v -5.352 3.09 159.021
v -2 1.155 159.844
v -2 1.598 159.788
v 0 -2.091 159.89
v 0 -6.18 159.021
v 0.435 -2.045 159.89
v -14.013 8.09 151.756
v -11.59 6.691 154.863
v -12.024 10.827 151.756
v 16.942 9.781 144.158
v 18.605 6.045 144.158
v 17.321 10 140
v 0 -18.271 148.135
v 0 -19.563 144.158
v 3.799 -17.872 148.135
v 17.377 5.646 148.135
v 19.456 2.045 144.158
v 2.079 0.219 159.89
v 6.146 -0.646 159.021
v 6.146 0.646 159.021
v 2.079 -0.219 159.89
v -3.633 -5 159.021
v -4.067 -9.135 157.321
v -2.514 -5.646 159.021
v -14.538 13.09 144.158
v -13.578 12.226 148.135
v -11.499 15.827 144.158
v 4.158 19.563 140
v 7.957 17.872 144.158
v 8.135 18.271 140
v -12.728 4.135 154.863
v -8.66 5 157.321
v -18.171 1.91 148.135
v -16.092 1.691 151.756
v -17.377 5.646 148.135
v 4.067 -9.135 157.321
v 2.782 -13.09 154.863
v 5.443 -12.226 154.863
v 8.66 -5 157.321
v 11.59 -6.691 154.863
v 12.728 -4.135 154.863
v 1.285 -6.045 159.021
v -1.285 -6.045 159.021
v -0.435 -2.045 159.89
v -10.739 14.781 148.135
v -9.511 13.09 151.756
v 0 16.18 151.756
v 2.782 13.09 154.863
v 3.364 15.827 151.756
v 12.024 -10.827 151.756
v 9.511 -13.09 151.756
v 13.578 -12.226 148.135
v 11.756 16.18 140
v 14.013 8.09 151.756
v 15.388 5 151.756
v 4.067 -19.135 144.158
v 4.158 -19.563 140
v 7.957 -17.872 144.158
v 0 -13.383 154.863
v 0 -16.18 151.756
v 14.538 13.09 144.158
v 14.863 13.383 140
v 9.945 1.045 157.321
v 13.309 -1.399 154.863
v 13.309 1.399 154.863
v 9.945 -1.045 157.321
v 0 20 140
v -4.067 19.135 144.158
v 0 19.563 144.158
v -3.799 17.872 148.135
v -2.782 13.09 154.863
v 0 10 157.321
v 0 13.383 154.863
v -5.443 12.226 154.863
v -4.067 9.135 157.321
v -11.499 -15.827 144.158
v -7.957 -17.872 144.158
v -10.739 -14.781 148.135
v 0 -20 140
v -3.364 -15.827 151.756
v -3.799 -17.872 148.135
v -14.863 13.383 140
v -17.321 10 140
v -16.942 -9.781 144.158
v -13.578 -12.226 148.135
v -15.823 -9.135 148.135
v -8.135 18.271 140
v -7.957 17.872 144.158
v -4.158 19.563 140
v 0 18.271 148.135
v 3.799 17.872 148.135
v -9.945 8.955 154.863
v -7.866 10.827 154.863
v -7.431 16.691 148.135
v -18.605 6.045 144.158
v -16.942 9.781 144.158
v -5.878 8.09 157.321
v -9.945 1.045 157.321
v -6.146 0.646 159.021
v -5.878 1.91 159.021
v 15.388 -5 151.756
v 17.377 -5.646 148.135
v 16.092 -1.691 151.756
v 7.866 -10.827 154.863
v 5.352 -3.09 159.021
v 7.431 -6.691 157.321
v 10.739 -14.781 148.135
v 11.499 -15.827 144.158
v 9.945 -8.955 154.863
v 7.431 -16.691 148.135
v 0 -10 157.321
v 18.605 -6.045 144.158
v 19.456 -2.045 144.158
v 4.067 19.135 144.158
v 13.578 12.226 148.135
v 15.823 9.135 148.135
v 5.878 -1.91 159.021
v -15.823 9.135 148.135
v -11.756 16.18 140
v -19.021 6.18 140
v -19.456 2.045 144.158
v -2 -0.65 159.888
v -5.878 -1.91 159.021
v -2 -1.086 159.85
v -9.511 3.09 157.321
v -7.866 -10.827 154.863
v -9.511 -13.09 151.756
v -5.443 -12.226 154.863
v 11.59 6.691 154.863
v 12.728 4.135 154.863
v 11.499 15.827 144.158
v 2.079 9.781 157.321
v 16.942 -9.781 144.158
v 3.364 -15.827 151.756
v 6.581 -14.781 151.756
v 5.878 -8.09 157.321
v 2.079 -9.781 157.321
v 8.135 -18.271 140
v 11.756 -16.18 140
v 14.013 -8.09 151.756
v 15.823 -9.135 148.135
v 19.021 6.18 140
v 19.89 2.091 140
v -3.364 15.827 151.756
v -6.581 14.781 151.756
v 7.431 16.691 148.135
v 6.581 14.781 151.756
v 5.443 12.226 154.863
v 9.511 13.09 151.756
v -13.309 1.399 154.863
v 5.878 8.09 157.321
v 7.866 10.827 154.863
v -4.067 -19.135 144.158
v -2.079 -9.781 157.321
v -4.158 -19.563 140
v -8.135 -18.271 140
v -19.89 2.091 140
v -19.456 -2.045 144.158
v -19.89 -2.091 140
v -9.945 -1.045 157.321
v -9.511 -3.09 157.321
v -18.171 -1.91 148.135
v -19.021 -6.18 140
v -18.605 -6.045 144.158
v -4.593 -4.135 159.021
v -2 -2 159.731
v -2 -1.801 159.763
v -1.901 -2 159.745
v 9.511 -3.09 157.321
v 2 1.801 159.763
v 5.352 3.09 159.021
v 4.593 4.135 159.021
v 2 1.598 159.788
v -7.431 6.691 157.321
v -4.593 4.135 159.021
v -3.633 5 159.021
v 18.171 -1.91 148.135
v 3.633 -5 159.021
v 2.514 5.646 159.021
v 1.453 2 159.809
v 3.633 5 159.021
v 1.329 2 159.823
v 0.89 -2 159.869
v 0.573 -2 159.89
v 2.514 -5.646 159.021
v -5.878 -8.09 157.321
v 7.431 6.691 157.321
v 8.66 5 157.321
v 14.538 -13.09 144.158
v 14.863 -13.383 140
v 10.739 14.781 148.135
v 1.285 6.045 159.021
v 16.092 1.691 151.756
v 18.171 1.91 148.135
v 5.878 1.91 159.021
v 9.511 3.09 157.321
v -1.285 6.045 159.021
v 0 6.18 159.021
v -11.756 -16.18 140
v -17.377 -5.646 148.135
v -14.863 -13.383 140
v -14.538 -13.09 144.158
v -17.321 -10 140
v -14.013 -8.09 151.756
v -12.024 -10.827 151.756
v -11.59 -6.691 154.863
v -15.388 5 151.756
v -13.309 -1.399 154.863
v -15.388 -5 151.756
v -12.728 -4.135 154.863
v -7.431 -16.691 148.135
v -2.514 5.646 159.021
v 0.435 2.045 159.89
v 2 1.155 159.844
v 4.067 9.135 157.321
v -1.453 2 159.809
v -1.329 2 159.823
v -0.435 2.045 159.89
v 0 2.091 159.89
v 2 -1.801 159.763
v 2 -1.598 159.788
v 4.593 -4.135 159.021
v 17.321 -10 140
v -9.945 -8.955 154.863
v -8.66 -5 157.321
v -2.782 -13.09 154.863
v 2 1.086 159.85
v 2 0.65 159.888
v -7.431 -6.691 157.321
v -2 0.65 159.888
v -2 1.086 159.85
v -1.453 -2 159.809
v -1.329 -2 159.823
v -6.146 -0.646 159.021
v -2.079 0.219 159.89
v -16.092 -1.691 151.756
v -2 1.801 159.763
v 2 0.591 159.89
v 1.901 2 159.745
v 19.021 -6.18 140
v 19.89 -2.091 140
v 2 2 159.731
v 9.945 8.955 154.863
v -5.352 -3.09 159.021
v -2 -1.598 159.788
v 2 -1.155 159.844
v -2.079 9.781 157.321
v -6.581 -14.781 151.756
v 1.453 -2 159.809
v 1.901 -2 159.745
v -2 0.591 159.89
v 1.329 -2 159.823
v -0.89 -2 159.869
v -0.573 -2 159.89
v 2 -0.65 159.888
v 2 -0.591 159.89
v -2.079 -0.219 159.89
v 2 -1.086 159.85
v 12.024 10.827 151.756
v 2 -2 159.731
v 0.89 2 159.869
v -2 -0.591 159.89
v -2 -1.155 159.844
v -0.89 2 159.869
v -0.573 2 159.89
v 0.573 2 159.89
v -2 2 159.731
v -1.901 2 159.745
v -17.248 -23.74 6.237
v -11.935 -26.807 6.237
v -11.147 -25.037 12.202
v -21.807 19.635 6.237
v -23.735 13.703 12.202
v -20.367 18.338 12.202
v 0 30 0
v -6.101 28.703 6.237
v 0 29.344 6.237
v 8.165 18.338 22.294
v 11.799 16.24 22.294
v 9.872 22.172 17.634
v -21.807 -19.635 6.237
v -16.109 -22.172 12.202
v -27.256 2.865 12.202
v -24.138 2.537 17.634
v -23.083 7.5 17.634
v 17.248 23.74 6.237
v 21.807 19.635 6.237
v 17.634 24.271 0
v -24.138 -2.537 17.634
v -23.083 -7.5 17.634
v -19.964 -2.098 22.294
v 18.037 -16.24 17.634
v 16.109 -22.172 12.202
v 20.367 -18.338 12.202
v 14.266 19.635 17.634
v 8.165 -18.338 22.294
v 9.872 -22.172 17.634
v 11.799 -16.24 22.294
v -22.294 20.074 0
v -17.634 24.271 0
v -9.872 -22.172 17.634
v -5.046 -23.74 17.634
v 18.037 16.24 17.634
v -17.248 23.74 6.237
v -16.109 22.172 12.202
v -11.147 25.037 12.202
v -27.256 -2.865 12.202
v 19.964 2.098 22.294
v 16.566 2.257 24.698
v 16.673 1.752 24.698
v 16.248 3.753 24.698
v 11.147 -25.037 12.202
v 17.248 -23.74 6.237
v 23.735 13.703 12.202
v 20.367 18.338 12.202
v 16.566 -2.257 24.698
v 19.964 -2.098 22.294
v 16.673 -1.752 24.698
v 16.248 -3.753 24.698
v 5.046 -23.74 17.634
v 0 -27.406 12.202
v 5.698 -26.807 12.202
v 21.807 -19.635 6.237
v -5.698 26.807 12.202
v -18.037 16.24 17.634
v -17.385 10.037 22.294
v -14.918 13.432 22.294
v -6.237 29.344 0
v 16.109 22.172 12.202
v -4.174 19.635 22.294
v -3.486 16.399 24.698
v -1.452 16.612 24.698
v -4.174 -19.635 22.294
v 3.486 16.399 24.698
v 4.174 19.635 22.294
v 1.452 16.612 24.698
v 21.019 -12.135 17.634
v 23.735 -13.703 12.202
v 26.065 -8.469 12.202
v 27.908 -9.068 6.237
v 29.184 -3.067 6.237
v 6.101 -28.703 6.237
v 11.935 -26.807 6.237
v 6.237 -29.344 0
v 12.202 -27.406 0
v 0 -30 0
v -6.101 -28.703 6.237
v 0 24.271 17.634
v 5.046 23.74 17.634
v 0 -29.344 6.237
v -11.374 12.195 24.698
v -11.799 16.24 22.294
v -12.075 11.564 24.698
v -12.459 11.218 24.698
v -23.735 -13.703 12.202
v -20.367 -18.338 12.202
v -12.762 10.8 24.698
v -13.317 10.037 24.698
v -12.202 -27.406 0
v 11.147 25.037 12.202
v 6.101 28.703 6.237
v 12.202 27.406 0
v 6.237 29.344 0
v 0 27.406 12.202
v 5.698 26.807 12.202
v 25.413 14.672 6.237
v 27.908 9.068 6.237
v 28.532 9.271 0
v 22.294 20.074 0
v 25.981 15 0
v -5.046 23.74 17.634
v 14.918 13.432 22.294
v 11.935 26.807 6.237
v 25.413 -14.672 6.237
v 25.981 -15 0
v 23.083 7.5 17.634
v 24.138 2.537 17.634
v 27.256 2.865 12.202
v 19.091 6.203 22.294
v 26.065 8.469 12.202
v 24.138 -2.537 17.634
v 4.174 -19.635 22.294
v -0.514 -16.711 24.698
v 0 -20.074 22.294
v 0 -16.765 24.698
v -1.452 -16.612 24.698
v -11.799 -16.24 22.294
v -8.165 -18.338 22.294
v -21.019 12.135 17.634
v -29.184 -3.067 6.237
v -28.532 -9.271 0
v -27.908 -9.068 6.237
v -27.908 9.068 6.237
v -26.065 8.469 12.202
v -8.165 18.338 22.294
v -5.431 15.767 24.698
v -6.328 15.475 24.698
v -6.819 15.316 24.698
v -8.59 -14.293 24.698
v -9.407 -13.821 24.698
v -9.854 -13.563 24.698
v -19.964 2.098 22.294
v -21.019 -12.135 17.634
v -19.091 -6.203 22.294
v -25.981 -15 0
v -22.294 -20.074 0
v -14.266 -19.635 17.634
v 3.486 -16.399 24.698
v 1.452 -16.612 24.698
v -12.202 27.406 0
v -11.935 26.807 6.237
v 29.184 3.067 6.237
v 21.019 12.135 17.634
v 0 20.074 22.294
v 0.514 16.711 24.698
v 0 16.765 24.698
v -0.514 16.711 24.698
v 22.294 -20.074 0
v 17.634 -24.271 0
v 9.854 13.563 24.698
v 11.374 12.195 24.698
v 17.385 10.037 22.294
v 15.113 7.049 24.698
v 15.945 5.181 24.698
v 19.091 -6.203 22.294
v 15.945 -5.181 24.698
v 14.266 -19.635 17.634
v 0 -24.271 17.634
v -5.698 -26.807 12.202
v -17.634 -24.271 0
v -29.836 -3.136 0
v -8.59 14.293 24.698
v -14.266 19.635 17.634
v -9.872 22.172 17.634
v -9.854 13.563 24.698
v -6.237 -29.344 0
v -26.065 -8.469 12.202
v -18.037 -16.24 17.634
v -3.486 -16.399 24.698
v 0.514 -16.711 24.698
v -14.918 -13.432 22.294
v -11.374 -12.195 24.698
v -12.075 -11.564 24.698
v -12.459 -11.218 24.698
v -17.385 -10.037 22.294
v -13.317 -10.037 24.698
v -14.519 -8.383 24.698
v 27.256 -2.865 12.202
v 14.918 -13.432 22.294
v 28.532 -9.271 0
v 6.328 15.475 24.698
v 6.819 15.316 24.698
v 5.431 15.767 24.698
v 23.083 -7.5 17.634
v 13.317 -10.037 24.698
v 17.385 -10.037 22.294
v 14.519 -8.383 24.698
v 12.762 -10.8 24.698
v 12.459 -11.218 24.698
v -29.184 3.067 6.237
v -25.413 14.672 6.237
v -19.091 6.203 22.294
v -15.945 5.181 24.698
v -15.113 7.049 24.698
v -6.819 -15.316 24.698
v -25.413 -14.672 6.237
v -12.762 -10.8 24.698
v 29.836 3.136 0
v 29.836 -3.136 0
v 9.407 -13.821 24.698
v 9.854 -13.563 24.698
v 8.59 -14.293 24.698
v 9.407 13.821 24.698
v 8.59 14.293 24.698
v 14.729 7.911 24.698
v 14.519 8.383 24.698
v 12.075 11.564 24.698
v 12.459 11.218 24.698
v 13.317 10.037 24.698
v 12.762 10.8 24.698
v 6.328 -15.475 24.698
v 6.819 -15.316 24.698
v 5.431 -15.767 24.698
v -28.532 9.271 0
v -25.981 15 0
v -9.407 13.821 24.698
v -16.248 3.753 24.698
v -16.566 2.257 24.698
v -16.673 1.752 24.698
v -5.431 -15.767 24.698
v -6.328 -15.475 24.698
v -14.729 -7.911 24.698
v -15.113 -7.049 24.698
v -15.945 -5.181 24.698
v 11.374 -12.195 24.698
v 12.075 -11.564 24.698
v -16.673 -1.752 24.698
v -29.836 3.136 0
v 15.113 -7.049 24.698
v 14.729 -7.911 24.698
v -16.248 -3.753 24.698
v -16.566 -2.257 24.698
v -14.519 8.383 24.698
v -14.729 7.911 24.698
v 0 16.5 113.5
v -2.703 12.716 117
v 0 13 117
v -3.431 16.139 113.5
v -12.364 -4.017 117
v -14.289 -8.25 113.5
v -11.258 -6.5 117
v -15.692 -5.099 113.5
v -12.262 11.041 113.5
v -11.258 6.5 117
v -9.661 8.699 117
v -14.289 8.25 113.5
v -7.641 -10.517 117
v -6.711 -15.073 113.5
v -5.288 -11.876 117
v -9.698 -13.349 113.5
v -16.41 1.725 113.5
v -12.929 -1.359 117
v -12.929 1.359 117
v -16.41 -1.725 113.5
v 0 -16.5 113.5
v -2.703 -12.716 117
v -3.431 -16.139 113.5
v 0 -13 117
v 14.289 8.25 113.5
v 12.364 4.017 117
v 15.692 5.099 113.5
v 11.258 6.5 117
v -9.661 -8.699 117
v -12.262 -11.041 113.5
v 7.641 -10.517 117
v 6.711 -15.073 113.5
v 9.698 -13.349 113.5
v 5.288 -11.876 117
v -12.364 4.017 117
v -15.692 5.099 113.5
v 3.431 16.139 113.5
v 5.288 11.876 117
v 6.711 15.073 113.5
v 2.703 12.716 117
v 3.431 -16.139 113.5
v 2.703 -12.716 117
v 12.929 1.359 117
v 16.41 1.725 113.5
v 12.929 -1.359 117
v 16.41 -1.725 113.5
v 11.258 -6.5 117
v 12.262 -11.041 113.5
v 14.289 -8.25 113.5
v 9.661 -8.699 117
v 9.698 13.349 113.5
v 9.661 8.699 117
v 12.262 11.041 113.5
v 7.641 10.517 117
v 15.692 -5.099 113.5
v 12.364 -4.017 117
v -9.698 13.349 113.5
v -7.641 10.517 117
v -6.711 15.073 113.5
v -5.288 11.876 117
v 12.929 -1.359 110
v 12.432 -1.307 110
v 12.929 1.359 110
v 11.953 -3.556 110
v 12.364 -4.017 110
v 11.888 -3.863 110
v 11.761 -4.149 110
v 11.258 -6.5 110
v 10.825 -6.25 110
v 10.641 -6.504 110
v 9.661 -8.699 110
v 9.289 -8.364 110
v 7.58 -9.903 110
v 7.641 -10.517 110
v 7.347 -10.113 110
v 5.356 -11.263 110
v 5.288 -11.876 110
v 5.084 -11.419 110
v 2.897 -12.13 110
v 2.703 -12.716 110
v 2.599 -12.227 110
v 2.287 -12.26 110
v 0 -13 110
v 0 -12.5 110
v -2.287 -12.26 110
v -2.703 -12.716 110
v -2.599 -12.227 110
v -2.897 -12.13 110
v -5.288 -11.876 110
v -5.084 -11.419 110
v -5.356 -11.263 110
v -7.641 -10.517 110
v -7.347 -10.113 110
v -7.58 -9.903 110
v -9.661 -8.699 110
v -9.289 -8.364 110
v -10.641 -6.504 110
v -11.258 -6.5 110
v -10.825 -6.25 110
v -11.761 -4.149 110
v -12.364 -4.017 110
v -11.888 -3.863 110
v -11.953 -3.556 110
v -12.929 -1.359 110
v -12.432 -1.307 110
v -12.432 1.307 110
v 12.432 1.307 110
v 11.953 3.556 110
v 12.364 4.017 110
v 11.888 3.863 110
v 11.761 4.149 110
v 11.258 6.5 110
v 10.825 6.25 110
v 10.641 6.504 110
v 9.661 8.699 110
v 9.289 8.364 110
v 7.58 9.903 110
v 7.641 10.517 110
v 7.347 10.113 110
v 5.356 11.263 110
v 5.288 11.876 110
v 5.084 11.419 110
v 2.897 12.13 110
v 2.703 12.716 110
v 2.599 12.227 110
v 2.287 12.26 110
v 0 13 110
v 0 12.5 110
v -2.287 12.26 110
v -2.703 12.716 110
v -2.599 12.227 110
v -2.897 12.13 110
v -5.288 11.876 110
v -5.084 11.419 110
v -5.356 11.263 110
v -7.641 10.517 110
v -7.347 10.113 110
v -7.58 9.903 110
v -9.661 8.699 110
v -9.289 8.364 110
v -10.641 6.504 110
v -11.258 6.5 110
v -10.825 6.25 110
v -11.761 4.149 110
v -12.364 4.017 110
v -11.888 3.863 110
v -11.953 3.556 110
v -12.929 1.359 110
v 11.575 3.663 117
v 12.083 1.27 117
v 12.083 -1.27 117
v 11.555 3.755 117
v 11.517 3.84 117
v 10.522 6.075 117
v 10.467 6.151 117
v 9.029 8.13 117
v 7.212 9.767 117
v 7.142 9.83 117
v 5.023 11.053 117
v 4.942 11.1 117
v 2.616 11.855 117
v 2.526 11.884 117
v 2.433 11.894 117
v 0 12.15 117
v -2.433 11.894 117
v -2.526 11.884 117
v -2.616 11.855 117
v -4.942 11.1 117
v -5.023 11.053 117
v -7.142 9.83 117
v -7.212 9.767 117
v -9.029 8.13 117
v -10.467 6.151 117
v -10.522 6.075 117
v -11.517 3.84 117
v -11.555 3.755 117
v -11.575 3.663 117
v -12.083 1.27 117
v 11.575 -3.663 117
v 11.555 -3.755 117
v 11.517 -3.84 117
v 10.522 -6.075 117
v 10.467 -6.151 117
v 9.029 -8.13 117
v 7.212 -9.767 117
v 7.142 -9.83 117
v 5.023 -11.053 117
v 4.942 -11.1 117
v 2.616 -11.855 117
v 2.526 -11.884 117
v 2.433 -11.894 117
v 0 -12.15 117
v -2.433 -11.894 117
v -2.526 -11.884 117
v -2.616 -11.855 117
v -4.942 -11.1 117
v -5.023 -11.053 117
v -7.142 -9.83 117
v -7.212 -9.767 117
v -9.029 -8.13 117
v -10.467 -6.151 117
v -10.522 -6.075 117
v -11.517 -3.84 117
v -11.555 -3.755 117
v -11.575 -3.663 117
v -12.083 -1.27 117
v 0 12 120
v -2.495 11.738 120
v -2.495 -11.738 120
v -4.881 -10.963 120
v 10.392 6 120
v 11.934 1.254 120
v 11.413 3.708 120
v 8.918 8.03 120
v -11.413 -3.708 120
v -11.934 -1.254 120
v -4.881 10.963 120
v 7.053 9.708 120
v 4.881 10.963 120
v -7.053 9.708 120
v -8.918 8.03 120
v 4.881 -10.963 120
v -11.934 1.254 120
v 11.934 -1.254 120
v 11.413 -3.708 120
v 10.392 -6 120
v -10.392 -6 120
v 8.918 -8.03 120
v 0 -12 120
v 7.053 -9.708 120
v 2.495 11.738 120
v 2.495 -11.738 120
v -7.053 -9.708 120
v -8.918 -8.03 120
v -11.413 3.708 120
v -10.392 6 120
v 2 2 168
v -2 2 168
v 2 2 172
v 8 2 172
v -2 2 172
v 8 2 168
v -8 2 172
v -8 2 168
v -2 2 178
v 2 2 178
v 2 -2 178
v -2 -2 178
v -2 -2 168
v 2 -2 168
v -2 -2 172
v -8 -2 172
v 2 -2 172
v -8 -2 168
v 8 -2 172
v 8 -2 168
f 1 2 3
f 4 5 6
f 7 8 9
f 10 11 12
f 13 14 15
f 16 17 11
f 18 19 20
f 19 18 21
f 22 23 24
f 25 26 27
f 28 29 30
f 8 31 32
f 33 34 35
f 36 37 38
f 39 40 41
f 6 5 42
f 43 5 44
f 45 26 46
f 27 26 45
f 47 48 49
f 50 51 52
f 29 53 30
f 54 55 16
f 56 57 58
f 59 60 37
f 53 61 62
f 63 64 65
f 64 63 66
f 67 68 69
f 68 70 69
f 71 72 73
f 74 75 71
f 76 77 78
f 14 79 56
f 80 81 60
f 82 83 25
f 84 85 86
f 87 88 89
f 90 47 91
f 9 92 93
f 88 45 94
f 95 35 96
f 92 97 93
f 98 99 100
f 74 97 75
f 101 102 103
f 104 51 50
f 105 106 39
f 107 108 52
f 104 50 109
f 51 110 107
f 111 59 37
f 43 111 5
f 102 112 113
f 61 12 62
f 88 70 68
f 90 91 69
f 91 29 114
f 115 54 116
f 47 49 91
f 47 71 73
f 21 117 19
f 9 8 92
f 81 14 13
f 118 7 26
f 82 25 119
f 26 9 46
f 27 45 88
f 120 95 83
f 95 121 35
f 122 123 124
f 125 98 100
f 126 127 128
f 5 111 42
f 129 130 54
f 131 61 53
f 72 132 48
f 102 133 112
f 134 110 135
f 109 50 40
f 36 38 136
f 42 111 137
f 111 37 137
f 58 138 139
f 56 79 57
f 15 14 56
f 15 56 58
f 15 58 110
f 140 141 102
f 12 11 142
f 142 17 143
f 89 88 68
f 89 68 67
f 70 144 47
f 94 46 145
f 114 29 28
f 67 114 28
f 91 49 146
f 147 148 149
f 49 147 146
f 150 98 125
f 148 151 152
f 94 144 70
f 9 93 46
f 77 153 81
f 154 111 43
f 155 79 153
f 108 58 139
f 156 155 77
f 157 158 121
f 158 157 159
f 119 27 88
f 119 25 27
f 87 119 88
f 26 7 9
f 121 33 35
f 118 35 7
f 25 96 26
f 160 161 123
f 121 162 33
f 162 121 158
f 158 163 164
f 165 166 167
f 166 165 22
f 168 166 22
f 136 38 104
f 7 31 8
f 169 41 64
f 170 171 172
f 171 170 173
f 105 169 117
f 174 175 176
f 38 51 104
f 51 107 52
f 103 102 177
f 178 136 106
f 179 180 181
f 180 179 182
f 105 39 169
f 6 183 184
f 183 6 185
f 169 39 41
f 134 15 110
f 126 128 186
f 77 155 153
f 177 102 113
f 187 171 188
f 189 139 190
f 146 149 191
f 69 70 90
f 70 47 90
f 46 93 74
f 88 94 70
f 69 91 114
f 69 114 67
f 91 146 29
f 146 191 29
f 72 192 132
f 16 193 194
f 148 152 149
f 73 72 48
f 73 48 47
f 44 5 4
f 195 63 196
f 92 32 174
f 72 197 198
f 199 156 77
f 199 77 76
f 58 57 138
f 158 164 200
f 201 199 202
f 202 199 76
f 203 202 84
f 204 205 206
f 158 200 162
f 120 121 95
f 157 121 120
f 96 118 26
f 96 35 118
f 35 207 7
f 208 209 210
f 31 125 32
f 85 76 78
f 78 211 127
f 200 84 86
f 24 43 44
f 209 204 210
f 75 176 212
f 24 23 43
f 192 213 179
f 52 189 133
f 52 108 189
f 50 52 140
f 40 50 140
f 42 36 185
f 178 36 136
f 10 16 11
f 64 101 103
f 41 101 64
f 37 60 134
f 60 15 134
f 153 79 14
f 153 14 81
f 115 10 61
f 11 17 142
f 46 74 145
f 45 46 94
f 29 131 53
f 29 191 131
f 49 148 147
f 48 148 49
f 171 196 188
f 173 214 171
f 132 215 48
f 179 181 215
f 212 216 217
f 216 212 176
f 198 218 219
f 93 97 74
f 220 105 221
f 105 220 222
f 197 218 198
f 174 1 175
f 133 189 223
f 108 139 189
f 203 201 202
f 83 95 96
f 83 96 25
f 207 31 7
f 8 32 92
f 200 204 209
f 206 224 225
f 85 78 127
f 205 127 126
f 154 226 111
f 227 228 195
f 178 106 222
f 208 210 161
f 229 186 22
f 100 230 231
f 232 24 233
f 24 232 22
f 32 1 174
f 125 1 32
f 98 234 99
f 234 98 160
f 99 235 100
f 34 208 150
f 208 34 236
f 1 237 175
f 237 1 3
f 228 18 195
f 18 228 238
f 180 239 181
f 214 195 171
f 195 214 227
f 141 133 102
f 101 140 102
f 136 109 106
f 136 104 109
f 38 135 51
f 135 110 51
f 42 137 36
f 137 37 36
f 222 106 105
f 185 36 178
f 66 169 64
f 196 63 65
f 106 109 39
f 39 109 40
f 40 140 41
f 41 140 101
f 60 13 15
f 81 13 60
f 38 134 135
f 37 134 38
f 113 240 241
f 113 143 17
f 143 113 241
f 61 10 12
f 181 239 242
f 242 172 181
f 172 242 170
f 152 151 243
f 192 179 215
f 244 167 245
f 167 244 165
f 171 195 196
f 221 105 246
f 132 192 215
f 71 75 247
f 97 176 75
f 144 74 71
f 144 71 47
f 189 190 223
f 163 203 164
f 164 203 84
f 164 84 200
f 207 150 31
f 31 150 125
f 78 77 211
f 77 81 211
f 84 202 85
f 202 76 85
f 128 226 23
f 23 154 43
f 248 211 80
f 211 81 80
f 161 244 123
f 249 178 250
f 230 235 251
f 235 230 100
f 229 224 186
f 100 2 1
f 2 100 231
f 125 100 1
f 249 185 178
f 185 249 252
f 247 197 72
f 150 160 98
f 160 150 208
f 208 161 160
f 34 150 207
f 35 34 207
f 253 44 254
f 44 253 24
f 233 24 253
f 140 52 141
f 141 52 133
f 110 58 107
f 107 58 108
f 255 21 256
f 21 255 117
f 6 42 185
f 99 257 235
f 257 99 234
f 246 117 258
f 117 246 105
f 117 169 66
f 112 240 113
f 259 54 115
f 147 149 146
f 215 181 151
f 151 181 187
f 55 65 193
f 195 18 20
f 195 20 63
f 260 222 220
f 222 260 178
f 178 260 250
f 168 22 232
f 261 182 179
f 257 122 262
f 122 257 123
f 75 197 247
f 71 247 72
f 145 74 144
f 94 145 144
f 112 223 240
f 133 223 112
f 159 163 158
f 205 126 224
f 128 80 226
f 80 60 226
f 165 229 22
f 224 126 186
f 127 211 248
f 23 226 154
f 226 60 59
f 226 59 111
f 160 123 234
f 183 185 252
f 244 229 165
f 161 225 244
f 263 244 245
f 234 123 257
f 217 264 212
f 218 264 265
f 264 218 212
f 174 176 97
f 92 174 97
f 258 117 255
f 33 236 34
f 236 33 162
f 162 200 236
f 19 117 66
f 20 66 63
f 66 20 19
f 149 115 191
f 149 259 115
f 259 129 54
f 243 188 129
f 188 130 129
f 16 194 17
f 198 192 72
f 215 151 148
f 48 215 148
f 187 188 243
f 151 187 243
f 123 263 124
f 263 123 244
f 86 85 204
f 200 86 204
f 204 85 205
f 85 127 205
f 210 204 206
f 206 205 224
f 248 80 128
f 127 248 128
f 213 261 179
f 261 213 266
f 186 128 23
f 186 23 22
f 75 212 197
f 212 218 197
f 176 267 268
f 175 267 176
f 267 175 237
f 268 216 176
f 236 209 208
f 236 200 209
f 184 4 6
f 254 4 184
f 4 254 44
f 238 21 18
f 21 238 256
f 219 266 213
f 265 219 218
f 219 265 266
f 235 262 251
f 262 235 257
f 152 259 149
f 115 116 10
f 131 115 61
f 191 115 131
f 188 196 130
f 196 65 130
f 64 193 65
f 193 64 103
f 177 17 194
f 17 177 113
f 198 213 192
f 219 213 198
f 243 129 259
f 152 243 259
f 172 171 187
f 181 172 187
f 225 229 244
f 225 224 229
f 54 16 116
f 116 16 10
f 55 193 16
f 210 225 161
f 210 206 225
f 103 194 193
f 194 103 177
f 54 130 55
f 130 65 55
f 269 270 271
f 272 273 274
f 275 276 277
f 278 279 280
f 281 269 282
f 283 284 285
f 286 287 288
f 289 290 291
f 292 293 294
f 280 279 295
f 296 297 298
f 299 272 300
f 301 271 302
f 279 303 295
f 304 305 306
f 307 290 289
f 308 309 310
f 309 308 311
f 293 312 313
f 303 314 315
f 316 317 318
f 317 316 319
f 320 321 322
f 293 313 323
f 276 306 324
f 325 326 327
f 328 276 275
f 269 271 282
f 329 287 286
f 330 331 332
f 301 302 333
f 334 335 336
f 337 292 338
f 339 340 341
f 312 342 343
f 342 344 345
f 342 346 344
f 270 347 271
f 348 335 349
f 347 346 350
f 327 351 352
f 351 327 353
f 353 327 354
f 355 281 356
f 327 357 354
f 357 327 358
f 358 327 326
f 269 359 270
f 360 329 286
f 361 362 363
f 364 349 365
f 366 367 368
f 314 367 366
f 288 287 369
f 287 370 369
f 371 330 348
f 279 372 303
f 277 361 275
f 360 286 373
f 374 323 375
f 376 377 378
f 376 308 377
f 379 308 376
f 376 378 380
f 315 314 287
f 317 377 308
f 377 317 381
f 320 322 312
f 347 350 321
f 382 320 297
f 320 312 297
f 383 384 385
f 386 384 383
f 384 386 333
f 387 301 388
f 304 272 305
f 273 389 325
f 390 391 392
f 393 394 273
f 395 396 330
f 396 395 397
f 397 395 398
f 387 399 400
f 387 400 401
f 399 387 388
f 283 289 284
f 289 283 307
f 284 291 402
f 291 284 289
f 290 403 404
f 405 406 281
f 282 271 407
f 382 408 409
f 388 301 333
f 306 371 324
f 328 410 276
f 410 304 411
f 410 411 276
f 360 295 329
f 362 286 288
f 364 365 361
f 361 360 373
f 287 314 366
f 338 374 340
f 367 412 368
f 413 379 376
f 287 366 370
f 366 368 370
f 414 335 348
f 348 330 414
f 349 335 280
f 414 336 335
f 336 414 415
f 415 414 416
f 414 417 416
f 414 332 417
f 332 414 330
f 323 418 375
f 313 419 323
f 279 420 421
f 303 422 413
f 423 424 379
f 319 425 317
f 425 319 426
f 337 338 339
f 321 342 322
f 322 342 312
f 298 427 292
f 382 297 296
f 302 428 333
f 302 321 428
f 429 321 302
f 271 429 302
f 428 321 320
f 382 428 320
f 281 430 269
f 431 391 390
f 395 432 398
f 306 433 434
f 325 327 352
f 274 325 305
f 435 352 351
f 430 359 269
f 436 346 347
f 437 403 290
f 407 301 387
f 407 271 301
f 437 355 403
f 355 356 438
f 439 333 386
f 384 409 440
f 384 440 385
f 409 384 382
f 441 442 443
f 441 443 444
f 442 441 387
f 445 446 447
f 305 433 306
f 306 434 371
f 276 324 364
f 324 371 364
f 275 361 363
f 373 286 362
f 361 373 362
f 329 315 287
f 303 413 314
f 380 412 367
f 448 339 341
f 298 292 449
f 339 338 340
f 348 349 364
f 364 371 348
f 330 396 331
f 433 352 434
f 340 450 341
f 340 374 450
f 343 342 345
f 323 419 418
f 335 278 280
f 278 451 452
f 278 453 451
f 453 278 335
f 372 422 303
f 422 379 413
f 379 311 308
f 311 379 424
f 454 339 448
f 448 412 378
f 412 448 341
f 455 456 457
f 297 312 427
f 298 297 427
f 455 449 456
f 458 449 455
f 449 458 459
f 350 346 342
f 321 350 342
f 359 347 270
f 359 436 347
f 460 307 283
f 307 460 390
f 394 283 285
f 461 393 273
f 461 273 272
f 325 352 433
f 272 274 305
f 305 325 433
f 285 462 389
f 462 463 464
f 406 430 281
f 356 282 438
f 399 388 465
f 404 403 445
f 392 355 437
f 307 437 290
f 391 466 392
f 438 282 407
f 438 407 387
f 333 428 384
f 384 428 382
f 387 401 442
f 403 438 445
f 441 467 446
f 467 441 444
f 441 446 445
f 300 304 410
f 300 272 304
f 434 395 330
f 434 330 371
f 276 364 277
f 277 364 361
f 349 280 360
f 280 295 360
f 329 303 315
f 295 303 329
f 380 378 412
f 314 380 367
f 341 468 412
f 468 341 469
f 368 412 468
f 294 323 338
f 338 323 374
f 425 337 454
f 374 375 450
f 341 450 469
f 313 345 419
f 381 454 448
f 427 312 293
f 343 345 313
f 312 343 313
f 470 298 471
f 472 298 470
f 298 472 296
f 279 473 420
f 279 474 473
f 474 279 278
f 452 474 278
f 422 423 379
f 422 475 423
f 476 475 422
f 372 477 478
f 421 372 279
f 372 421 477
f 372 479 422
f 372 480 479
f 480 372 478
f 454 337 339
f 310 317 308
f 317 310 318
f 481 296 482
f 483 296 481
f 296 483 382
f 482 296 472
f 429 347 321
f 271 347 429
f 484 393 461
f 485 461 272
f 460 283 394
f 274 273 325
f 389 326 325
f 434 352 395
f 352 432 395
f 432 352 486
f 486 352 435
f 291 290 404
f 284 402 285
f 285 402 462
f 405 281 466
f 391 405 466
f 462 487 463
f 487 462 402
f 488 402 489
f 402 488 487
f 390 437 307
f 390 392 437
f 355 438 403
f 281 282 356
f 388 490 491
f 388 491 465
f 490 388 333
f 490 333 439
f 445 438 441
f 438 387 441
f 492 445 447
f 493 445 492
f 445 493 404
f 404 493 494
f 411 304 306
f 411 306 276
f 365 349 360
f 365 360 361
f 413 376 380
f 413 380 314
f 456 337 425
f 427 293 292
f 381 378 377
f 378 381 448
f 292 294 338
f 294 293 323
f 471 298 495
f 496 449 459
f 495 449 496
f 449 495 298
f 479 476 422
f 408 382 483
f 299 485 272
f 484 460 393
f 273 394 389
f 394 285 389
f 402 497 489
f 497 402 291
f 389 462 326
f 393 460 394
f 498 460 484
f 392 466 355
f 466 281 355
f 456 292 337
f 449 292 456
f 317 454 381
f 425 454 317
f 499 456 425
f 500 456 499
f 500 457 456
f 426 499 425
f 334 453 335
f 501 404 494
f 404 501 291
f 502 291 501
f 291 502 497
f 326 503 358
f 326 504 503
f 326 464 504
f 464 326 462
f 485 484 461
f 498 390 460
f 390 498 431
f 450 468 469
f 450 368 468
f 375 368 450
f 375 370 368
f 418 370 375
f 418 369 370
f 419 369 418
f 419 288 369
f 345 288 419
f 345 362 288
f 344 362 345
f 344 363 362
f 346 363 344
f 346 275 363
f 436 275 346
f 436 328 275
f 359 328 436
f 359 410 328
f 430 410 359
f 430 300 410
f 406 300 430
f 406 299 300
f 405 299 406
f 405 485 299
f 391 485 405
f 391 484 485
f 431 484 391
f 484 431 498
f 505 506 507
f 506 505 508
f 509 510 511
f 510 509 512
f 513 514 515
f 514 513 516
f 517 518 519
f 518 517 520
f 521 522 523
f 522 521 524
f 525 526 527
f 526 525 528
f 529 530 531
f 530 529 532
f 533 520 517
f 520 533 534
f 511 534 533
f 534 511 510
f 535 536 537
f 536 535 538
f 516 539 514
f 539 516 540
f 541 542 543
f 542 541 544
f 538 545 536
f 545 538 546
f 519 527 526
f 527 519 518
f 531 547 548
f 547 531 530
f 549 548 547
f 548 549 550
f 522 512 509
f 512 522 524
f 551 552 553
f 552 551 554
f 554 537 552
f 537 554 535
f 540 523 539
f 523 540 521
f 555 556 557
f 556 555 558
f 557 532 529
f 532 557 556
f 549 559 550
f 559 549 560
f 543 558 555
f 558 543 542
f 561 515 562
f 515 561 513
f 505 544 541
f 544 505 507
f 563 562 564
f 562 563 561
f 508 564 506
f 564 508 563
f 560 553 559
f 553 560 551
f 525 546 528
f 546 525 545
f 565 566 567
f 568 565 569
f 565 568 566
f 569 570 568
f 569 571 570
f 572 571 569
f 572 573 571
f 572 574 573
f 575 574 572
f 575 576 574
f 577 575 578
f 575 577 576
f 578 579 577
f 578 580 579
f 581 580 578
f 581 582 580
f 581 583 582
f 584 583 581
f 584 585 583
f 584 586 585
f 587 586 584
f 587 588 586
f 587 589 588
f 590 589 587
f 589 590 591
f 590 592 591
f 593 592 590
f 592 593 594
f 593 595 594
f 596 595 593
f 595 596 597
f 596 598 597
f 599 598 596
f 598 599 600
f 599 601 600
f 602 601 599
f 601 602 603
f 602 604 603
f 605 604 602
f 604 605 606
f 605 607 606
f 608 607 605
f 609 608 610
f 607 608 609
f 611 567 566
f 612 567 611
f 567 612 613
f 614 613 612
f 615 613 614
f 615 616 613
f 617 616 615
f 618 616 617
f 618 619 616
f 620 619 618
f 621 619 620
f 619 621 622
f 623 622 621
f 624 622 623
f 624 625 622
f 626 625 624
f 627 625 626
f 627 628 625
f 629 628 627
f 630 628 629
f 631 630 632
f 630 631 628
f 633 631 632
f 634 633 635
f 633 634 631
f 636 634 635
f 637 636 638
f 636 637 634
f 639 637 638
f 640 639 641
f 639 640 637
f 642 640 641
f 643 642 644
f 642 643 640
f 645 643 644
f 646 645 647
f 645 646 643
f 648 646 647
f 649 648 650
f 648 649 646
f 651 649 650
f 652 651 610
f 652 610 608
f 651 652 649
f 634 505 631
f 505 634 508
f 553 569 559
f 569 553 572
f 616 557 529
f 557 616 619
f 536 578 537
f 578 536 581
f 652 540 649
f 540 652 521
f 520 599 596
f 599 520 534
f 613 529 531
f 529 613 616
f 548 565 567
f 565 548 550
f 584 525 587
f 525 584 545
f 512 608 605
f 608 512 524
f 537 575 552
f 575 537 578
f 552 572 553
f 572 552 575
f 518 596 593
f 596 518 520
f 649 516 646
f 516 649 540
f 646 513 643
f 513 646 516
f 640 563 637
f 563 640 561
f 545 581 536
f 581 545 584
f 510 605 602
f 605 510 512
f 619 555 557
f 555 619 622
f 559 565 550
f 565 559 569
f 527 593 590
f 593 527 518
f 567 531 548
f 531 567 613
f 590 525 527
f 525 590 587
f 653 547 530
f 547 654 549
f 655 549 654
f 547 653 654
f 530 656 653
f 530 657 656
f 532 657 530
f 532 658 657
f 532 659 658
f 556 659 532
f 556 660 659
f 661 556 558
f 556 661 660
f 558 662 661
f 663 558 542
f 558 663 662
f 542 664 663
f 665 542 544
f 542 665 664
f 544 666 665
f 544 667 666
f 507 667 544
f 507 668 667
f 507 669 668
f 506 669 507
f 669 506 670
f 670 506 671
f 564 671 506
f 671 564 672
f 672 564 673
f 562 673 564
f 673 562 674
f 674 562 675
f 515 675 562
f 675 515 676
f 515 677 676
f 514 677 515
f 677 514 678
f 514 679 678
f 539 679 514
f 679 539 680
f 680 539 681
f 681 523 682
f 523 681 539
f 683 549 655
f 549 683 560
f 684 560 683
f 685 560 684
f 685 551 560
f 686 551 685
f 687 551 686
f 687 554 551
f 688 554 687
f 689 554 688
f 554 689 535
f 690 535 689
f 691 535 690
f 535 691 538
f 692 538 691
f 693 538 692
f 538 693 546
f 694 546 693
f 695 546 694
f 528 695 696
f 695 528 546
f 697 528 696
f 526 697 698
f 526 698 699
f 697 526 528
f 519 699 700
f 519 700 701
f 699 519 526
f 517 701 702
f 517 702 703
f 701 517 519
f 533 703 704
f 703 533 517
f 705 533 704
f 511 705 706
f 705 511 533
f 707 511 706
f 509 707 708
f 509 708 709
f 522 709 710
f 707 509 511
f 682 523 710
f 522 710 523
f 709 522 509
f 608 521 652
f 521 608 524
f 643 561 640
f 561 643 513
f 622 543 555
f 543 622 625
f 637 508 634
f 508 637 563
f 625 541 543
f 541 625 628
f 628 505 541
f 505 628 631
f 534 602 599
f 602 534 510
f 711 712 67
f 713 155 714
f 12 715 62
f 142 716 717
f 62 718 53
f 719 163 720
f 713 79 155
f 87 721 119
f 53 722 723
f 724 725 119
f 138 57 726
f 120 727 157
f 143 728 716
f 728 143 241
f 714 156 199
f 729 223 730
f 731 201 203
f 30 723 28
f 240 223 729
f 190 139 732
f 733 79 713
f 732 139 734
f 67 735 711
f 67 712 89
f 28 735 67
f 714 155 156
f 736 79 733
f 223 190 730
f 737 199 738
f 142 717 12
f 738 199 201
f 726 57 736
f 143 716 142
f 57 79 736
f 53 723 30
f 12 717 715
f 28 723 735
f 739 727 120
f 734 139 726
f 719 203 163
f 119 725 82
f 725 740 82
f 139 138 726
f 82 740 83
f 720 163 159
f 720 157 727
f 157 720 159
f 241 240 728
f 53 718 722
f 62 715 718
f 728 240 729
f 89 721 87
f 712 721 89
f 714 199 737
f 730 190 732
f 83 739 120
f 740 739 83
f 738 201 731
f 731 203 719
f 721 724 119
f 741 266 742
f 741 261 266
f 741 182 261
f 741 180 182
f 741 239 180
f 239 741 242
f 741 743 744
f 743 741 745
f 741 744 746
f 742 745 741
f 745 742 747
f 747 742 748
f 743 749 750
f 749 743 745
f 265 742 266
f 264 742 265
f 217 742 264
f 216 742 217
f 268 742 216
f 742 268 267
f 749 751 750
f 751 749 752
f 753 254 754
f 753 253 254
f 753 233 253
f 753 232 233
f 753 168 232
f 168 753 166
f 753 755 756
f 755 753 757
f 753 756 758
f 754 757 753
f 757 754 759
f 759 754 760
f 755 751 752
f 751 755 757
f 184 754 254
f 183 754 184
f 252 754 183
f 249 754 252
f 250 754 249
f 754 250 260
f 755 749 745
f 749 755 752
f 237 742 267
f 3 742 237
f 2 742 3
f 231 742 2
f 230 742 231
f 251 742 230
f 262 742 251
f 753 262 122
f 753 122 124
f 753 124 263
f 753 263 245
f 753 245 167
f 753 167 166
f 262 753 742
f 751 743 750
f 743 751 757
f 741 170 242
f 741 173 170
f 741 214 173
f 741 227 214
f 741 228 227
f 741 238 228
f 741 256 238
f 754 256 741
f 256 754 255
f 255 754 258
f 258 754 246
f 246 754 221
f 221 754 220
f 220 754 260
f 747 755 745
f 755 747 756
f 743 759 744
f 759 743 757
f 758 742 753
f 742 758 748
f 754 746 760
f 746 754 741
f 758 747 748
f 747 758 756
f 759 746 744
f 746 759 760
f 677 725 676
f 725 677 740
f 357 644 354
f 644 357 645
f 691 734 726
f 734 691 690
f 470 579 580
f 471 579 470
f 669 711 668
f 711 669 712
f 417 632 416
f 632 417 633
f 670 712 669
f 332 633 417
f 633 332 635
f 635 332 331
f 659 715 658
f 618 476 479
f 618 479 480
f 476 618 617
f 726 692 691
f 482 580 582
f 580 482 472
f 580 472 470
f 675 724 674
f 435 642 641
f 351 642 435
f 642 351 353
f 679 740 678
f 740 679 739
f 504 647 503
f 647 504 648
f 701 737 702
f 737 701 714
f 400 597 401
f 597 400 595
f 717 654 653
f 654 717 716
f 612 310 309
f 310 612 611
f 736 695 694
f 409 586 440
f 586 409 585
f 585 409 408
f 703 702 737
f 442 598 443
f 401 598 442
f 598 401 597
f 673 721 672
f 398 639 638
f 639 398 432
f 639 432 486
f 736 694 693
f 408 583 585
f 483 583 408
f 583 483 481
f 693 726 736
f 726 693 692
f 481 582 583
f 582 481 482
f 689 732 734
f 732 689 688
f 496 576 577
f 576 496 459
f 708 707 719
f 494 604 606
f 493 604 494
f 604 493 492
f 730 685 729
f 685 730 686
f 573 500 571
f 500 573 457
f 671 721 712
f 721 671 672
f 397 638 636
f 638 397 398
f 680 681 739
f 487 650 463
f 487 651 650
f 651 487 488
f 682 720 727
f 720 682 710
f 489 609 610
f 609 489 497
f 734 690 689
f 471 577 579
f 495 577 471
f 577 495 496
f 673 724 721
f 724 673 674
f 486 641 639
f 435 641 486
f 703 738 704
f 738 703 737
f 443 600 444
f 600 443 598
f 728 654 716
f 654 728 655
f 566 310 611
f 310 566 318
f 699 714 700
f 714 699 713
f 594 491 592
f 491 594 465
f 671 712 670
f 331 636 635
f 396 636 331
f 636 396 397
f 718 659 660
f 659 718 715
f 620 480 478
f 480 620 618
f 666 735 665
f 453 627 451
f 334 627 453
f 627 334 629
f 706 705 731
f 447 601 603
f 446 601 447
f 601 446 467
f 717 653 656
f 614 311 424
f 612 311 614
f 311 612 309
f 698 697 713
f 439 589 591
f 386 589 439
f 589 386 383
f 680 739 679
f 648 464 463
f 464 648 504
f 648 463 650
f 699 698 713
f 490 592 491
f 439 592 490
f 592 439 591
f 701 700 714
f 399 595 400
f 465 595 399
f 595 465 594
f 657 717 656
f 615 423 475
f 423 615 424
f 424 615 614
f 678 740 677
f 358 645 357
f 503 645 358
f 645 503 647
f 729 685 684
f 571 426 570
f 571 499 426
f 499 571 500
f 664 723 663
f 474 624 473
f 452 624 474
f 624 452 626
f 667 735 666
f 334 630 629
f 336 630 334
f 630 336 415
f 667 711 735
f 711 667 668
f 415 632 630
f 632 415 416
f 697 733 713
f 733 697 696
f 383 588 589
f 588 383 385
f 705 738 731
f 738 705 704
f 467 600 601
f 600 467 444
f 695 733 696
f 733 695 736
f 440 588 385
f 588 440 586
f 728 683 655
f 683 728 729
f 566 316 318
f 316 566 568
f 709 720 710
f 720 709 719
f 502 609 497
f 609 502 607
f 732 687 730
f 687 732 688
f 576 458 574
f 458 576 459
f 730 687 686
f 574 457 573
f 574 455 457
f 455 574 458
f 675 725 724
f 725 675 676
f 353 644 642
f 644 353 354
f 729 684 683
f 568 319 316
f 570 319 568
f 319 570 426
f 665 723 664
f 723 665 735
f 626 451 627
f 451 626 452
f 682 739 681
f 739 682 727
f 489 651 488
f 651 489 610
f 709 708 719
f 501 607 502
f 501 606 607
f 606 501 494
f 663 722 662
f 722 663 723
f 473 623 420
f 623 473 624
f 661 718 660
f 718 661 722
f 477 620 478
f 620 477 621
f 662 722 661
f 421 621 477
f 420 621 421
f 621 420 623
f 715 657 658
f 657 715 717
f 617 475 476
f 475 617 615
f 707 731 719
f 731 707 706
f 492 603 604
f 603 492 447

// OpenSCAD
module king(color) {
	rotate(90)
		color(color)union() {
			// Head
			translate([0,0,120])
				cylinder(20,12,20);
			translate([0,0,140])
				intersection() {
					sphere(20);
					translate([0,0,50])
						cube(100,true);
				}
			translate([0,0,168])
				cube([4,4,20],true);
			translate([0,0,170])
				cube([4,16,4],true);
			// Body
  			cylinder(120,18,12);
			// Base
	  		intersection() {
				sphere(30);
				translate([0,0,50])
					cube(100,true);
			}
			// Collar
  			translate([0, 0, 110])
    			intersection() {
      			cylinder(20,20,0);
     	 			translate([0, 0, 7])
        				mirror([0, 0, 1])
          				cylinder(20,20,0);
    			}
			}
		}
color = "white";
king(color);
